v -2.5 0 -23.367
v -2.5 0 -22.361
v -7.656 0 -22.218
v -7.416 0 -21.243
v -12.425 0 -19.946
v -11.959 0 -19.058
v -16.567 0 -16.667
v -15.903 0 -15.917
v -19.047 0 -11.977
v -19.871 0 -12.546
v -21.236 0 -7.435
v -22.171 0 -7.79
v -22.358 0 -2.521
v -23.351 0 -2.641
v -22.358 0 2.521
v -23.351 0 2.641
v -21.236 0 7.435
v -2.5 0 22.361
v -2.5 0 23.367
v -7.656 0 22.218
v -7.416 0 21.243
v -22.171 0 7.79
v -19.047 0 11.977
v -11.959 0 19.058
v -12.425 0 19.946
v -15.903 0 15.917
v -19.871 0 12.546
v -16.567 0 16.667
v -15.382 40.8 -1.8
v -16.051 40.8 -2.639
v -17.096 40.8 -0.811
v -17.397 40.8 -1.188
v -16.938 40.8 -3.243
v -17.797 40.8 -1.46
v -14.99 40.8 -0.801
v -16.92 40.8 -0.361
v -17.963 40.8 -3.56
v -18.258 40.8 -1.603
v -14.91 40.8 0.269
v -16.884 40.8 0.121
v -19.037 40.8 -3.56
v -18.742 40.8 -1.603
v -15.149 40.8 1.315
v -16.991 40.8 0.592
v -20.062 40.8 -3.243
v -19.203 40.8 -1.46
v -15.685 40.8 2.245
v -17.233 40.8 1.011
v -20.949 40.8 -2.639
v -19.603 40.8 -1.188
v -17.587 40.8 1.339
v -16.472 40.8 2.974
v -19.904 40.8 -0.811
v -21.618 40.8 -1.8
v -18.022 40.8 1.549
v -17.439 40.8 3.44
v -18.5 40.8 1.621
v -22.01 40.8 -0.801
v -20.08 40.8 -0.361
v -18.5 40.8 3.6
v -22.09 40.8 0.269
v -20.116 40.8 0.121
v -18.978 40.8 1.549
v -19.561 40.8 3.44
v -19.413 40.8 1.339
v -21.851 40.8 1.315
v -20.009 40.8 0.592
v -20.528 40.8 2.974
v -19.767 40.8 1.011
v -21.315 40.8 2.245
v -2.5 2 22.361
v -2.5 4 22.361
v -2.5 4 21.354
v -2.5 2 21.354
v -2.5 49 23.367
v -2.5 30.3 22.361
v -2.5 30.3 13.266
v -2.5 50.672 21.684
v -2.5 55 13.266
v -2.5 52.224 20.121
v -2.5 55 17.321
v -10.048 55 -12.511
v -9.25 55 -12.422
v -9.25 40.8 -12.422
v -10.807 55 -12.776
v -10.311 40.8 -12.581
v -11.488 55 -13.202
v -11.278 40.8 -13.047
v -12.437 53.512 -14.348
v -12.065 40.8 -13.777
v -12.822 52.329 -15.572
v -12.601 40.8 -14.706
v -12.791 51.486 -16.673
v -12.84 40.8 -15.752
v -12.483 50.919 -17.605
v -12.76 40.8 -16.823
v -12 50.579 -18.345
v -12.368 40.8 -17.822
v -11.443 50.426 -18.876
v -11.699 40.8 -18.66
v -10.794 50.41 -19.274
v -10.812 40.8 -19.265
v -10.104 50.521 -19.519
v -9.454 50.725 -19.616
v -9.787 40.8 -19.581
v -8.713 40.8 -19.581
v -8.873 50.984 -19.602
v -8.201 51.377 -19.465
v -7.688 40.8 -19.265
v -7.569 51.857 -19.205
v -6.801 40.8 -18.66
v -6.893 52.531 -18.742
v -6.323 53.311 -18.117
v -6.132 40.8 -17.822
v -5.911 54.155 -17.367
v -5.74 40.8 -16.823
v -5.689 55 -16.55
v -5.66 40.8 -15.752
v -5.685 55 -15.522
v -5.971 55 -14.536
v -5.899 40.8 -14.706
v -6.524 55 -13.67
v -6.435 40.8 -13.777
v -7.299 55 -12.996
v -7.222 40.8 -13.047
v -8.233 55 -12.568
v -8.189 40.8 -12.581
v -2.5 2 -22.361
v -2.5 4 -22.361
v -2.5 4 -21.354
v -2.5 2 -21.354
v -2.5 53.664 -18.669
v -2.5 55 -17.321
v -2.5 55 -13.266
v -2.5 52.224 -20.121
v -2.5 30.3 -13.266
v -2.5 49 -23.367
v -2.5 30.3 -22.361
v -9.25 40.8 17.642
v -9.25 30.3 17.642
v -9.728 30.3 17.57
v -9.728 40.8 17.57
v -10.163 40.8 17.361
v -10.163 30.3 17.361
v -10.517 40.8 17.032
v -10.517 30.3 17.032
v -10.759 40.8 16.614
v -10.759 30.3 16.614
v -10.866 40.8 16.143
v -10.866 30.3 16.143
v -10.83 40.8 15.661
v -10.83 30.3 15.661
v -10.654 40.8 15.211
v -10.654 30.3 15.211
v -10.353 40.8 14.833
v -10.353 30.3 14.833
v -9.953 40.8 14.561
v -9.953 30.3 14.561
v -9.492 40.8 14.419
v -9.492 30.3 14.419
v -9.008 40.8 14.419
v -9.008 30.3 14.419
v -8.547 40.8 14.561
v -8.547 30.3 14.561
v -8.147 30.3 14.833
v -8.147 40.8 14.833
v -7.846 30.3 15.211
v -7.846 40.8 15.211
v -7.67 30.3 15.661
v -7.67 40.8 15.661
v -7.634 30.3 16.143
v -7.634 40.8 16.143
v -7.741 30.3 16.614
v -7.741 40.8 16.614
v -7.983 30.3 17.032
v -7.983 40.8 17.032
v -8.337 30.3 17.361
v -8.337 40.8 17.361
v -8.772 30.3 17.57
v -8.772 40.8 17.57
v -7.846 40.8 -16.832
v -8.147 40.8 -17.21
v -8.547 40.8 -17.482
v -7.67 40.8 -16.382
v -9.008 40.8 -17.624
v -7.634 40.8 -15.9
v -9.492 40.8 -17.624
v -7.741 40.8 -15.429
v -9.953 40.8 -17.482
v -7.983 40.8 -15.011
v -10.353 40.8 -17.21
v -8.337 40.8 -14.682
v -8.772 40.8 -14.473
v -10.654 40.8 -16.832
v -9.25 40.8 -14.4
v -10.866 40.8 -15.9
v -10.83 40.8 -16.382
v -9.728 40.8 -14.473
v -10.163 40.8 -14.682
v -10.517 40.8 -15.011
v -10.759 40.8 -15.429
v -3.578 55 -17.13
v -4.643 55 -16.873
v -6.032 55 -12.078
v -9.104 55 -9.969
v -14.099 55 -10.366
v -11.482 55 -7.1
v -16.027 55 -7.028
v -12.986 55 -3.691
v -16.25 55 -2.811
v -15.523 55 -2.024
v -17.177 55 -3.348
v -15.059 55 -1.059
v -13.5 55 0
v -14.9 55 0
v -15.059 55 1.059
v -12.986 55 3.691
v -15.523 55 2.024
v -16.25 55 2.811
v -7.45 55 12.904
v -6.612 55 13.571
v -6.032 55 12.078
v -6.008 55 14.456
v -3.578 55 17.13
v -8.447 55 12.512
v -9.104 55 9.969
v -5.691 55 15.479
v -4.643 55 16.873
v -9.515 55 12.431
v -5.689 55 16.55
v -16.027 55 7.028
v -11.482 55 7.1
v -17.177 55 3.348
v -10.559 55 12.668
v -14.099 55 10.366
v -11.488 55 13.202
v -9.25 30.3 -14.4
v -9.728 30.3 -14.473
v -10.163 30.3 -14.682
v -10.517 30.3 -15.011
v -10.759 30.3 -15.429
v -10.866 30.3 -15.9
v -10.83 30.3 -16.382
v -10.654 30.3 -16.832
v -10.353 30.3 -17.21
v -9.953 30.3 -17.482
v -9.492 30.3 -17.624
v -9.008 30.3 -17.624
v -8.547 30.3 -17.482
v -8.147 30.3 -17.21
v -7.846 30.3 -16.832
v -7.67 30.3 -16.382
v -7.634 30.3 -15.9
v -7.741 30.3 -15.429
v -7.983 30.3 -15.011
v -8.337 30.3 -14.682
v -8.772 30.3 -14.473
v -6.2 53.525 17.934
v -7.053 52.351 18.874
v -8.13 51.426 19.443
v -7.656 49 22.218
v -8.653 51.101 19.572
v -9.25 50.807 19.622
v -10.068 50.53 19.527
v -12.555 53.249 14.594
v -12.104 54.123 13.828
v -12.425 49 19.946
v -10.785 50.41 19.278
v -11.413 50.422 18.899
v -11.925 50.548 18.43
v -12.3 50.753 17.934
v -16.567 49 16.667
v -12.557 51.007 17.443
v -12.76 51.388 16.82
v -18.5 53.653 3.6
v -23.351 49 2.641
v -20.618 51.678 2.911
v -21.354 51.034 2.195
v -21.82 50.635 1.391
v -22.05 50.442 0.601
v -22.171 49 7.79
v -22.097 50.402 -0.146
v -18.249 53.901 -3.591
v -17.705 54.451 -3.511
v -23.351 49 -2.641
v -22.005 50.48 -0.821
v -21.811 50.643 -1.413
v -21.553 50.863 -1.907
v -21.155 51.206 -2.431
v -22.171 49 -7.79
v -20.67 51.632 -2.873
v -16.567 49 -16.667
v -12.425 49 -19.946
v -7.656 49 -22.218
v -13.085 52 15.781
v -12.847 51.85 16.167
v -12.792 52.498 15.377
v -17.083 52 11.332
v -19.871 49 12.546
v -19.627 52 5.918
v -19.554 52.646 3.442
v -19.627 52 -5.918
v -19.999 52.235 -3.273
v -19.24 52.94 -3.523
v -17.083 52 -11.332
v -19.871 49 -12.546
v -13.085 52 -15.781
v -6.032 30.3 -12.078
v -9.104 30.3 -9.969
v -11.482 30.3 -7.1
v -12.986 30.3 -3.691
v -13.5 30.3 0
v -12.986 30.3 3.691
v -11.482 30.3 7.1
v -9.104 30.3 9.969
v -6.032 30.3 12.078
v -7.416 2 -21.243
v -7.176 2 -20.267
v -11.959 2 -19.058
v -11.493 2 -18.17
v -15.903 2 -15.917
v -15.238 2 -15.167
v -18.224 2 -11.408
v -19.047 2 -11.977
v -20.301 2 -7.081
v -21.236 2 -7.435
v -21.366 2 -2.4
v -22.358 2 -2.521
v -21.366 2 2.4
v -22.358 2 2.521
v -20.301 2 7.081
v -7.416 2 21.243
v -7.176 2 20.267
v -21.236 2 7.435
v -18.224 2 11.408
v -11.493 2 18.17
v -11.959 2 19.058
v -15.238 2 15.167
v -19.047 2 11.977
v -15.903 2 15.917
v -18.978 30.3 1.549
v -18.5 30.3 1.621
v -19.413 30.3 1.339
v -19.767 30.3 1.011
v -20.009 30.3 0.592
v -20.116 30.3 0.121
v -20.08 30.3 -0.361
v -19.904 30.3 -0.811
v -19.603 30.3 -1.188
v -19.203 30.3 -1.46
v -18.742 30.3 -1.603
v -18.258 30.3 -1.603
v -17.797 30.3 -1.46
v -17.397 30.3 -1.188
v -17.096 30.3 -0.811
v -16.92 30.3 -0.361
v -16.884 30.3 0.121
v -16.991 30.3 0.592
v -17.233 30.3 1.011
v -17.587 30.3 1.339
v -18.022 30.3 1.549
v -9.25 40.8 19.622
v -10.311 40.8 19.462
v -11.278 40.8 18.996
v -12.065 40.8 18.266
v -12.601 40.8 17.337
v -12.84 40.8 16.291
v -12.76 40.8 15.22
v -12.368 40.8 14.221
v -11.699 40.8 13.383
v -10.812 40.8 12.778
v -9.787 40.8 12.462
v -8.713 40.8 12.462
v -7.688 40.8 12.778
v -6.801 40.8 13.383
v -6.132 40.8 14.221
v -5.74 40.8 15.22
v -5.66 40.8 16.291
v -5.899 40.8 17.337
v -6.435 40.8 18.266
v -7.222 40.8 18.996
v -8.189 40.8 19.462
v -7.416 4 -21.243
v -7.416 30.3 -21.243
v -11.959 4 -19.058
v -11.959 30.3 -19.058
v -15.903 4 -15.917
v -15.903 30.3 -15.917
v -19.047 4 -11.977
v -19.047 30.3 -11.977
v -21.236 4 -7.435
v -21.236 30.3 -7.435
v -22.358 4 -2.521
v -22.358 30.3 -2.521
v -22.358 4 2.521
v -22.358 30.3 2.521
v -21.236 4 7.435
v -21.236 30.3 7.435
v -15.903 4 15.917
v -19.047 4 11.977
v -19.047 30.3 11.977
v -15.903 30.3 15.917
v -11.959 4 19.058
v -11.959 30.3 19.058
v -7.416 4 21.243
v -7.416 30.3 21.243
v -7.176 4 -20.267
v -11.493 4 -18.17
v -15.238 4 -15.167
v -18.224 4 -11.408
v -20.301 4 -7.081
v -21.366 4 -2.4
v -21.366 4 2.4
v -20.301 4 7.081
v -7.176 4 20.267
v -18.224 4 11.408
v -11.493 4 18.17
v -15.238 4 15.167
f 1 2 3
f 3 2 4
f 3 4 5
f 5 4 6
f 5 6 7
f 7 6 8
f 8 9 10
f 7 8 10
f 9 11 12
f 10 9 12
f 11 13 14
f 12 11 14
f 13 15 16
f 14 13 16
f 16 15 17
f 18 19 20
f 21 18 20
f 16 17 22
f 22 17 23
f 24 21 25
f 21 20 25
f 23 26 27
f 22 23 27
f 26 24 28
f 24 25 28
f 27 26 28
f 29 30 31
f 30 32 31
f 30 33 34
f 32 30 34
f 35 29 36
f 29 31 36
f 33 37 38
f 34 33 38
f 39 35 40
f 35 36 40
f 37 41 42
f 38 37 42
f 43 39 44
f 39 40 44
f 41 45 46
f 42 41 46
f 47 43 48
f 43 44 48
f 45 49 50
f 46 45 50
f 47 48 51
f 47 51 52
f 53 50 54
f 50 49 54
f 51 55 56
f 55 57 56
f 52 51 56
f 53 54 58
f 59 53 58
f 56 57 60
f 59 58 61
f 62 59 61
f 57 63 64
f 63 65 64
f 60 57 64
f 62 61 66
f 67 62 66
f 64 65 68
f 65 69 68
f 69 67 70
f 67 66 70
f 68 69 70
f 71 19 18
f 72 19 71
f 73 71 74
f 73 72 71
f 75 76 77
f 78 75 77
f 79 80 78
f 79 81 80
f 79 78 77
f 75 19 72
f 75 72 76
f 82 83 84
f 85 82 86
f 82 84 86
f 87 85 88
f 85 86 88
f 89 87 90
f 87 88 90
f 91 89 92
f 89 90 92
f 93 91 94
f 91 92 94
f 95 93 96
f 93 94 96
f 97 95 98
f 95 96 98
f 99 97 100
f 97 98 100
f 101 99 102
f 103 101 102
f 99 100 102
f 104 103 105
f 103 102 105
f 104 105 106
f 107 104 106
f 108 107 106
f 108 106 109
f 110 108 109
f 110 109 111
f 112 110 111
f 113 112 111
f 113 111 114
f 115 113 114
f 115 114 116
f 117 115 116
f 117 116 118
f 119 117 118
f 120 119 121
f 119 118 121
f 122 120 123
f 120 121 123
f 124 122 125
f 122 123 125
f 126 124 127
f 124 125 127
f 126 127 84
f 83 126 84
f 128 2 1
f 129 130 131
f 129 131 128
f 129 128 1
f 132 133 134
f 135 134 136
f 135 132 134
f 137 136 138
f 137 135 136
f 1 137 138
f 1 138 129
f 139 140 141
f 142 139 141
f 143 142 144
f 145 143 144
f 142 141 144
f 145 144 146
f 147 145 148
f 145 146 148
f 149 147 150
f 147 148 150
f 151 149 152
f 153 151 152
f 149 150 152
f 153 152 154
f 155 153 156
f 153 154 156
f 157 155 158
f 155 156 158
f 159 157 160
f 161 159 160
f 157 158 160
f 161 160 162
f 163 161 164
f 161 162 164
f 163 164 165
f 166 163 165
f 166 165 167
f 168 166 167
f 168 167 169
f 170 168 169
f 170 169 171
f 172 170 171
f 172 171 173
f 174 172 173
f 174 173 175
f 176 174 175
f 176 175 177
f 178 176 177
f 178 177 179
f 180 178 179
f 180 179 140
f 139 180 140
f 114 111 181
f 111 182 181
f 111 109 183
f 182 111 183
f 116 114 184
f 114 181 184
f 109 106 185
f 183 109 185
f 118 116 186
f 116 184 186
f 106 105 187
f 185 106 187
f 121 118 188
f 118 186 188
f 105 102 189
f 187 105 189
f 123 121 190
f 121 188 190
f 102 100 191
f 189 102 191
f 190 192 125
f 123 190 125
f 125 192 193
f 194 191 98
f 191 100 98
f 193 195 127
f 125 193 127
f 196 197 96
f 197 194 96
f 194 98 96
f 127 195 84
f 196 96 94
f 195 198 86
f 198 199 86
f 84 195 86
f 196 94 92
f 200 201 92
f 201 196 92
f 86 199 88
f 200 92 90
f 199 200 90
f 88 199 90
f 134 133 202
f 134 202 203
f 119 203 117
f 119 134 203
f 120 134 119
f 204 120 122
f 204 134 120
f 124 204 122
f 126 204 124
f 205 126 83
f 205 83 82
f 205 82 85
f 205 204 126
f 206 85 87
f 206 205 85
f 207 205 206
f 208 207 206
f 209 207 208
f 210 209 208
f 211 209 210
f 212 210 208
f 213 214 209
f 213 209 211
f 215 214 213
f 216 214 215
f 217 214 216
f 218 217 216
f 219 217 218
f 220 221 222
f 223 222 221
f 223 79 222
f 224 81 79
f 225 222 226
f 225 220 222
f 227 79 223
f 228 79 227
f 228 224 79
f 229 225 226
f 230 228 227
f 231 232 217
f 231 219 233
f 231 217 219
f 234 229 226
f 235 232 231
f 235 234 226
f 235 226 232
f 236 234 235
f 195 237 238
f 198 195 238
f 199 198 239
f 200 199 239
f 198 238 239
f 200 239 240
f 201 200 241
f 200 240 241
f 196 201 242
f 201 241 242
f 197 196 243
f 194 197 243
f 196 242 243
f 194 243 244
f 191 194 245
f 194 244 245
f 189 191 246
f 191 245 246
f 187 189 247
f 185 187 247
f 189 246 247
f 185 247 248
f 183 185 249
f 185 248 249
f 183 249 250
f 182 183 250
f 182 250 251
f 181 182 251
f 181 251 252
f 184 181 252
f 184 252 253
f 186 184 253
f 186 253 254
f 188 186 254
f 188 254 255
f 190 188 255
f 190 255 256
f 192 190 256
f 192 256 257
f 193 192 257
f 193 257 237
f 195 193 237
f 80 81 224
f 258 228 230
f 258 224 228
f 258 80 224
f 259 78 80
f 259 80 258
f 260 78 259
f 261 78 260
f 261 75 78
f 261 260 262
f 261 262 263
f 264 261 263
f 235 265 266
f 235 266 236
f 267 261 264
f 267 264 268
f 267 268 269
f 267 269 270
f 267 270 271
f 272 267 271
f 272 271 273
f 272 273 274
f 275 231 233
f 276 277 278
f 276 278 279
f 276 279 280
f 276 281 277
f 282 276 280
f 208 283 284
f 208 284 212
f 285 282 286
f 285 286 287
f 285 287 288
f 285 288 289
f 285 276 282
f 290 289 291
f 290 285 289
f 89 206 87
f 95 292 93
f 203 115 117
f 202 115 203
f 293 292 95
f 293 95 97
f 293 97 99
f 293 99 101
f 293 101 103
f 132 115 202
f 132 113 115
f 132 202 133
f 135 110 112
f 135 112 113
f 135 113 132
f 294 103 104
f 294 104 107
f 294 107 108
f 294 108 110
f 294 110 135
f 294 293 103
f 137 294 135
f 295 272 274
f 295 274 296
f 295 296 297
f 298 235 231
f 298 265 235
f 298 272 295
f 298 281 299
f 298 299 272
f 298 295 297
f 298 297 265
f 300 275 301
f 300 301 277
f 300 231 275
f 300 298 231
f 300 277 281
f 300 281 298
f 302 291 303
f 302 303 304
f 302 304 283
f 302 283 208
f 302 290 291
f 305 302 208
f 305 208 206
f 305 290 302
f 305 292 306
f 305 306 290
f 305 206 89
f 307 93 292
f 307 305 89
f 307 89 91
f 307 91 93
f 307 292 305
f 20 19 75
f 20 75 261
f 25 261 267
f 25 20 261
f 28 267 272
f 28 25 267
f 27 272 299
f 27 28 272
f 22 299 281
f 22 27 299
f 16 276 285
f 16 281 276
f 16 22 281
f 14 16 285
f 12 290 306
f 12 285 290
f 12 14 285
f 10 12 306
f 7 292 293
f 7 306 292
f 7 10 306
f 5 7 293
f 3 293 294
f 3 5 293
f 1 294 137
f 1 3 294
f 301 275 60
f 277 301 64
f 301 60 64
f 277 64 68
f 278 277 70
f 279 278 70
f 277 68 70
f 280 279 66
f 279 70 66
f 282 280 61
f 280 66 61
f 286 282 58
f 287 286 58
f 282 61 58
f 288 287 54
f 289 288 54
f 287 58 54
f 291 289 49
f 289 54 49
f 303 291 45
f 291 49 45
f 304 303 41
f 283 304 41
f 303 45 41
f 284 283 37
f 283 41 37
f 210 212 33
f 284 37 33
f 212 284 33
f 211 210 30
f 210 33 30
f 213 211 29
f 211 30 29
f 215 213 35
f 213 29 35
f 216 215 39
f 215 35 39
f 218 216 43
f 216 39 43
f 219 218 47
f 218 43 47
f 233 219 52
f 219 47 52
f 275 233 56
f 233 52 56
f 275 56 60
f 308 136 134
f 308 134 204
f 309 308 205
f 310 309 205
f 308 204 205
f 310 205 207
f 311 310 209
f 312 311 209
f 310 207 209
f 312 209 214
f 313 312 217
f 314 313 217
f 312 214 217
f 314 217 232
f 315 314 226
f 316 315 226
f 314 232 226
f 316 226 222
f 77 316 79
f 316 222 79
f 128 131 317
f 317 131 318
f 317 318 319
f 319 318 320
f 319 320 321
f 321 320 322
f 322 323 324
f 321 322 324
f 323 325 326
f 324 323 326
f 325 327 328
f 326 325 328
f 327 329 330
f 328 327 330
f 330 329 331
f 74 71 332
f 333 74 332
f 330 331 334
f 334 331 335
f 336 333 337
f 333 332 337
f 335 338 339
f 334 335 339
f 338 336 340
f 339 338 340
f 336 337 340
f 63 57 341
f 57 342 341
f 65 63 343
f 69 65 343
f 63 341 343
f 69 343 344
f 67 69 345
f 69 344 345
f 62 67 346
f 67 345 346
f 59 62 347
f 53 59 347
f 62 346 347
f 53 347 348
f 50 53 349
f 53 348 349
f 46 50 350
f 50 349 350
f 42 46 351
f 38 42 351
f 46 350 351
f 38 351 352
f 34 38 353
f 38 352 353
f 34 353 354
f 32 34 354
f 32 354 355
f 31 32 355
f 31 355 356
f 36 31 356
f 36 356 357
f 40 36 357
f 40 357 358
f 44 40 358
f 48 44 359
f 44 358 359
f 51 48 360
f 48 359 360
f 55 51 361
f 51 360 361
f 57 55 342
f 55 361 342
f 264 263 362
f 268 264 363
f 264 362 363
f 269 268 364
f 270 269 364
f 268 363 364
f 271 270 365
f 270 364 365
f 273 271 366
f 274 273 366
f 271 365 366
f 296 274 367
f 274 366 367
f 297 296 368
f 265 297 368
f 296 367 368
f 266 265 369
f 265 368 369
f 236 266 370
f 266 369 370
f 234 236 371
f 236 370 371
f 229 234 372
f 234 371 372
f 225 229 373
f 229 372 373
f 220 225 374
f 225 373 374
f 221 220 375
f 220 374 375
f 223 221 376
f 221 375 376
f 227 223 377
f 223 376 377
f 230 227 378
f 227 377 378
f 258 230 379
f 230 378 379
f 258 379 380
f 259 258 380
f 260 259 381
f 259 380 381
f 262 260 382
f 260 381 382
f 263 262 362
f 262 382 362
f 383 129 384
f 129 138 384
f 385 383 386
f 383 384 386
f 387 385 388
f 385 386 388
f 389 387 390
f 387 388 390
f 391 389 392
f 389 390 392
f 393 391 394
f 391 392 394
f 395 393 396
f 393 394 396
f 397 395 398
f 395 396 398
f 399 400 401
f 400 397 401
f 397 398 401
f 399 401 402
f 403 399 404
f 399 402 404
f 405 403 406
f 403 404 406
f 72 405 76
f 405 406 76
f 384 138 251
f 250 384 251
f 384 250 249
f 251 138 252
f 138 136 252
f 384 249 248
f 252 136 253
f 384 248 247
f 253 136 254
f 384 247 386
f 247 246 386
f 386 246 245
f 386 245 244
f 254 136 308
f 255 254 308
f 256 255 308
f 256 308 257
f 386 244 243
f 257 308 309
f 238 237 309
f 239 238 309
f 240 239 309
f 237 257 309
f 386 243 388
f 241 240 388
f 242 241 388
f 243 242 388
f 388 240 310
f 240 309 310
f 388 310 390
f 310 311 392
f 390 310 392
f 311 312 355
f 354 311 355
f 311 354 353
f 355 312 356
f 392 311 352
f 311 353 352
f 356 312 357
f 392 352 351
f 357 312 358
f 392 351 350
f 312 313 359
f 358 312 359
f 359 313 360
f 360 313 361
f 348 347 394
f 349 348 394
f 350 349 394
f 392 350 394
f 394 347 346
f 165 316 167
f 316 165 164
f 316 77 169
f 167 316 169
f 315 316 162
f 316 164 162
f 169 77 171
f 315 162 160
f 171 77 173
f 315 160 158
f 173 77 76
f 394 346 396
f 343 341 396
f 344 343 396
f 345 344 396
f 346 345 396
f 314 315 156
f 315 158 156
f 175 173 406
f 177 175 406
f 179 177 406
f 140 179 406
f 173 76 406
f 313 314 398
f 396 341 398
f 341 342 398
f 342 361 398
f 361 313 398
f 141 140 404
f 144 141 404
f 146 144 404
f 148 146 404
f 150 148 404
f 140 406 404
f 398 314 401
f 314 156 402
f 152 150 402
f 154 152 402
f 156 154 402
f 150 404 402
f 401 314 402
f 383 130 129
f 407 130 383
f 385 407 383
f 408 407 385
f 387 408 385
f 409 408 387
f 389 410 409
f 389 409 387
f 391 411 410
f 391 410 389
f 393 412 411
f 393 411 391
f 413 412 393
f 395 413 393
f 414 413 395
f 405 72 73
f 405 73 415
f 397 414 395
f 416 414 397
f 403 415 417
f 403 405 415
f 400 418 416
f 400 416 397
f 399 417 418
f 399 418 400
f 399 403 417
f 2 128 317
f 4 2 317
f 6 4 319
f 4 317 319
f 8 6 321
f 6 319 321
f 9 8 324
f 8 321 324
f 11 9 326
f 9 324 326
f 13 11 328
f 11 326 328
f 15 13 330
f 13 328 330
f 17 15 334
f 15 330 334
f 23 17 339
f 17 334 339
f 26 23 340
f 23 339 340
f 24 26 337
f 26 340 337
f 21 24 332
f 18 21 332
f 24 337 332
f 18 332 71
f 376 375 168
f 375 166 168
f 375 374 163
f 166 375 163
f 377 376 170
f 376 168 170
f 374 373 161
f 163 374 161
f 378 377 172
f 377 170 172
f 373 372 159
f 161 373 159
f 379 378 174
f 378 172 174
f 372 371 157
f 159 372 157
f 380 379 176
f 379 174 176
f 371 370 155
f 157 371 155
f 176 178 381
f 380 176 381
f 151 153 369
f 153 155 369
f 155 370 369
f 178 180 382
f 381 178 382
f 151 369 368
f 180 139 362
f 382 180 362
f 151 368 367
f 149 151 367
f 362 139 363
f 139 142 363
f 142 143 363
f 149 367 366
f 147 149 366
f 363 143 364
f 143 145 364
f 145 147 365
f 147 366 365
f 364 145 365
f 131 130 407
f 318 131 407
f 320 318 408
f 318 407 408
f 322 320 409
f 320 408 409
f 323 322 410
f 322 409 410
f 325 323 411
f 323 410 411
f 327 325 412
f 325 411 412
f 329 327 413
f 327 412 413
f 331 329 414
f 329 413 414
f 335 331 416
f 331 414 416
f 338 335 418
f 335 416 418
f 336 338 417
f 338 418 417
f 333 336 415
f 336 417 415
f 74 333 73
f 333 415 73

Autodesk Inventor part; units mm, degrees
ref_plane "YZ Plane" through (0, 0, 0) normal (1, 0, 0) x (0, 1, 0)
ref_plane "XZ Plane" through (0, 0, 0) normal (0, 1, 0) x (-1, 0, 0)
ref_plane "XY Plane" through (0, 0, 0) normal (0, 0, 1) x (1, 0, 0)
sketch "Sketch1" plane through (0, 0, 0) normal (0, 0, 1) x (1, 0, 0)
  line L0 (-13.5, 30.3) -> (-13.5, 55)
  line L1 (-13.5, 55) -> (-17.5, 55)
  line L2 (-17.5, 55) -> (-23.5, 49)
  line L3 (-23.5, 49) -> (-23.5, 0)
  line L4 (-23.5, 0) -> (-22.5, 0)
  line L5 (-22.5, 0) -> (-22.5, 2)
  line L6 (-22.5, 2) -> (-21.5, 2)
  line L7 (-21.5, 2) -> (-21.5, 4)
  line L8 (-21.5, 4) -> (-22.5, 4)
  line L9 (-22.5, 4) -> (-22.5, 30.3)
  line L10 (-22.5, 30.3) -> (-13.5, 30.3)
  line L11 (0, -11) -> (0, 66) projected
  point P0 (0, 0)
  point P1 (-23, 0)
  point P2 (-21.5, 3)
  dimension "d5" = 24.7
  dimension "d6" = 2
  dimension "d7" = 2
  dimension "d8" = 45
  dimension "d9" = 13.5
  dimension "d10" = 23.5
  dimension "d11" = 49
  dimension "d12" = 1
  dimension "d13" = 2
  dimension "d24" = 55
revolve "Revolution1" add sketch "Sketch1" angle 360 about axis through (0, -10, 0) along (0, 1, 0)
sketch "Sketch2" plane through (0, 55, 0) normal (0, 1, 0) x (1, 0, 0)
  line L0 (23.5, -23.5) -> (-2.5, -23.5)
  line L1 (-2.5, -23.5) -> (-2.5, 23.5)
  line L2 (-2.5, 23.5) -> (23.5, 23.5)
  line L3 (23.5, 23.5) -> (23.5, -23.5)
  circle A0 centre (0, 0) radius 23.5 projected
  point P0 (-2.5, 0)
  point P1 (23.5, 0)
  point P2 (0, -23.5)
  point P3 (0, 23.5)
  point P4 (-2.5, 23.3666)
  point P5 (-2.5, -23.3666)
  dimension "d1" = 2.5
extrude "Extrusion1" cut sketch "Sketch2" against normal through all contours L0 A0 L3 | A0 L1 | A0 L2 L3 picked at (6.1667, 0)
sketch "Sketch3" plane through (0, 55, 0) normal (0, 1, 0) x (1, 0, 0)
  circle A0 centre (0, 0) radius 18.5 construction
  point P0 (-18.5, 0)
  point P1 (-9.25, 16.0215)
  point P2 (-9.25, -16.0215)
  dimension "d14" = 37
  dimension "d15" = 60
  dimension "d16" = 60
hole "Hole1" at (-18.5, 55, 0) at (-9.25, 55, -16.0215) at (-9.25, 55, 16.0215) direction (0, -1, 0) diameter 3.242 end through all counterbore diameter 7.2 counterbore depth 14.2 thread size "M4x0.7" class "6H" standard "ANSI Metric M Profile"
properties part number "Clamp" material "Brass, Soft Yellow, Welded"
